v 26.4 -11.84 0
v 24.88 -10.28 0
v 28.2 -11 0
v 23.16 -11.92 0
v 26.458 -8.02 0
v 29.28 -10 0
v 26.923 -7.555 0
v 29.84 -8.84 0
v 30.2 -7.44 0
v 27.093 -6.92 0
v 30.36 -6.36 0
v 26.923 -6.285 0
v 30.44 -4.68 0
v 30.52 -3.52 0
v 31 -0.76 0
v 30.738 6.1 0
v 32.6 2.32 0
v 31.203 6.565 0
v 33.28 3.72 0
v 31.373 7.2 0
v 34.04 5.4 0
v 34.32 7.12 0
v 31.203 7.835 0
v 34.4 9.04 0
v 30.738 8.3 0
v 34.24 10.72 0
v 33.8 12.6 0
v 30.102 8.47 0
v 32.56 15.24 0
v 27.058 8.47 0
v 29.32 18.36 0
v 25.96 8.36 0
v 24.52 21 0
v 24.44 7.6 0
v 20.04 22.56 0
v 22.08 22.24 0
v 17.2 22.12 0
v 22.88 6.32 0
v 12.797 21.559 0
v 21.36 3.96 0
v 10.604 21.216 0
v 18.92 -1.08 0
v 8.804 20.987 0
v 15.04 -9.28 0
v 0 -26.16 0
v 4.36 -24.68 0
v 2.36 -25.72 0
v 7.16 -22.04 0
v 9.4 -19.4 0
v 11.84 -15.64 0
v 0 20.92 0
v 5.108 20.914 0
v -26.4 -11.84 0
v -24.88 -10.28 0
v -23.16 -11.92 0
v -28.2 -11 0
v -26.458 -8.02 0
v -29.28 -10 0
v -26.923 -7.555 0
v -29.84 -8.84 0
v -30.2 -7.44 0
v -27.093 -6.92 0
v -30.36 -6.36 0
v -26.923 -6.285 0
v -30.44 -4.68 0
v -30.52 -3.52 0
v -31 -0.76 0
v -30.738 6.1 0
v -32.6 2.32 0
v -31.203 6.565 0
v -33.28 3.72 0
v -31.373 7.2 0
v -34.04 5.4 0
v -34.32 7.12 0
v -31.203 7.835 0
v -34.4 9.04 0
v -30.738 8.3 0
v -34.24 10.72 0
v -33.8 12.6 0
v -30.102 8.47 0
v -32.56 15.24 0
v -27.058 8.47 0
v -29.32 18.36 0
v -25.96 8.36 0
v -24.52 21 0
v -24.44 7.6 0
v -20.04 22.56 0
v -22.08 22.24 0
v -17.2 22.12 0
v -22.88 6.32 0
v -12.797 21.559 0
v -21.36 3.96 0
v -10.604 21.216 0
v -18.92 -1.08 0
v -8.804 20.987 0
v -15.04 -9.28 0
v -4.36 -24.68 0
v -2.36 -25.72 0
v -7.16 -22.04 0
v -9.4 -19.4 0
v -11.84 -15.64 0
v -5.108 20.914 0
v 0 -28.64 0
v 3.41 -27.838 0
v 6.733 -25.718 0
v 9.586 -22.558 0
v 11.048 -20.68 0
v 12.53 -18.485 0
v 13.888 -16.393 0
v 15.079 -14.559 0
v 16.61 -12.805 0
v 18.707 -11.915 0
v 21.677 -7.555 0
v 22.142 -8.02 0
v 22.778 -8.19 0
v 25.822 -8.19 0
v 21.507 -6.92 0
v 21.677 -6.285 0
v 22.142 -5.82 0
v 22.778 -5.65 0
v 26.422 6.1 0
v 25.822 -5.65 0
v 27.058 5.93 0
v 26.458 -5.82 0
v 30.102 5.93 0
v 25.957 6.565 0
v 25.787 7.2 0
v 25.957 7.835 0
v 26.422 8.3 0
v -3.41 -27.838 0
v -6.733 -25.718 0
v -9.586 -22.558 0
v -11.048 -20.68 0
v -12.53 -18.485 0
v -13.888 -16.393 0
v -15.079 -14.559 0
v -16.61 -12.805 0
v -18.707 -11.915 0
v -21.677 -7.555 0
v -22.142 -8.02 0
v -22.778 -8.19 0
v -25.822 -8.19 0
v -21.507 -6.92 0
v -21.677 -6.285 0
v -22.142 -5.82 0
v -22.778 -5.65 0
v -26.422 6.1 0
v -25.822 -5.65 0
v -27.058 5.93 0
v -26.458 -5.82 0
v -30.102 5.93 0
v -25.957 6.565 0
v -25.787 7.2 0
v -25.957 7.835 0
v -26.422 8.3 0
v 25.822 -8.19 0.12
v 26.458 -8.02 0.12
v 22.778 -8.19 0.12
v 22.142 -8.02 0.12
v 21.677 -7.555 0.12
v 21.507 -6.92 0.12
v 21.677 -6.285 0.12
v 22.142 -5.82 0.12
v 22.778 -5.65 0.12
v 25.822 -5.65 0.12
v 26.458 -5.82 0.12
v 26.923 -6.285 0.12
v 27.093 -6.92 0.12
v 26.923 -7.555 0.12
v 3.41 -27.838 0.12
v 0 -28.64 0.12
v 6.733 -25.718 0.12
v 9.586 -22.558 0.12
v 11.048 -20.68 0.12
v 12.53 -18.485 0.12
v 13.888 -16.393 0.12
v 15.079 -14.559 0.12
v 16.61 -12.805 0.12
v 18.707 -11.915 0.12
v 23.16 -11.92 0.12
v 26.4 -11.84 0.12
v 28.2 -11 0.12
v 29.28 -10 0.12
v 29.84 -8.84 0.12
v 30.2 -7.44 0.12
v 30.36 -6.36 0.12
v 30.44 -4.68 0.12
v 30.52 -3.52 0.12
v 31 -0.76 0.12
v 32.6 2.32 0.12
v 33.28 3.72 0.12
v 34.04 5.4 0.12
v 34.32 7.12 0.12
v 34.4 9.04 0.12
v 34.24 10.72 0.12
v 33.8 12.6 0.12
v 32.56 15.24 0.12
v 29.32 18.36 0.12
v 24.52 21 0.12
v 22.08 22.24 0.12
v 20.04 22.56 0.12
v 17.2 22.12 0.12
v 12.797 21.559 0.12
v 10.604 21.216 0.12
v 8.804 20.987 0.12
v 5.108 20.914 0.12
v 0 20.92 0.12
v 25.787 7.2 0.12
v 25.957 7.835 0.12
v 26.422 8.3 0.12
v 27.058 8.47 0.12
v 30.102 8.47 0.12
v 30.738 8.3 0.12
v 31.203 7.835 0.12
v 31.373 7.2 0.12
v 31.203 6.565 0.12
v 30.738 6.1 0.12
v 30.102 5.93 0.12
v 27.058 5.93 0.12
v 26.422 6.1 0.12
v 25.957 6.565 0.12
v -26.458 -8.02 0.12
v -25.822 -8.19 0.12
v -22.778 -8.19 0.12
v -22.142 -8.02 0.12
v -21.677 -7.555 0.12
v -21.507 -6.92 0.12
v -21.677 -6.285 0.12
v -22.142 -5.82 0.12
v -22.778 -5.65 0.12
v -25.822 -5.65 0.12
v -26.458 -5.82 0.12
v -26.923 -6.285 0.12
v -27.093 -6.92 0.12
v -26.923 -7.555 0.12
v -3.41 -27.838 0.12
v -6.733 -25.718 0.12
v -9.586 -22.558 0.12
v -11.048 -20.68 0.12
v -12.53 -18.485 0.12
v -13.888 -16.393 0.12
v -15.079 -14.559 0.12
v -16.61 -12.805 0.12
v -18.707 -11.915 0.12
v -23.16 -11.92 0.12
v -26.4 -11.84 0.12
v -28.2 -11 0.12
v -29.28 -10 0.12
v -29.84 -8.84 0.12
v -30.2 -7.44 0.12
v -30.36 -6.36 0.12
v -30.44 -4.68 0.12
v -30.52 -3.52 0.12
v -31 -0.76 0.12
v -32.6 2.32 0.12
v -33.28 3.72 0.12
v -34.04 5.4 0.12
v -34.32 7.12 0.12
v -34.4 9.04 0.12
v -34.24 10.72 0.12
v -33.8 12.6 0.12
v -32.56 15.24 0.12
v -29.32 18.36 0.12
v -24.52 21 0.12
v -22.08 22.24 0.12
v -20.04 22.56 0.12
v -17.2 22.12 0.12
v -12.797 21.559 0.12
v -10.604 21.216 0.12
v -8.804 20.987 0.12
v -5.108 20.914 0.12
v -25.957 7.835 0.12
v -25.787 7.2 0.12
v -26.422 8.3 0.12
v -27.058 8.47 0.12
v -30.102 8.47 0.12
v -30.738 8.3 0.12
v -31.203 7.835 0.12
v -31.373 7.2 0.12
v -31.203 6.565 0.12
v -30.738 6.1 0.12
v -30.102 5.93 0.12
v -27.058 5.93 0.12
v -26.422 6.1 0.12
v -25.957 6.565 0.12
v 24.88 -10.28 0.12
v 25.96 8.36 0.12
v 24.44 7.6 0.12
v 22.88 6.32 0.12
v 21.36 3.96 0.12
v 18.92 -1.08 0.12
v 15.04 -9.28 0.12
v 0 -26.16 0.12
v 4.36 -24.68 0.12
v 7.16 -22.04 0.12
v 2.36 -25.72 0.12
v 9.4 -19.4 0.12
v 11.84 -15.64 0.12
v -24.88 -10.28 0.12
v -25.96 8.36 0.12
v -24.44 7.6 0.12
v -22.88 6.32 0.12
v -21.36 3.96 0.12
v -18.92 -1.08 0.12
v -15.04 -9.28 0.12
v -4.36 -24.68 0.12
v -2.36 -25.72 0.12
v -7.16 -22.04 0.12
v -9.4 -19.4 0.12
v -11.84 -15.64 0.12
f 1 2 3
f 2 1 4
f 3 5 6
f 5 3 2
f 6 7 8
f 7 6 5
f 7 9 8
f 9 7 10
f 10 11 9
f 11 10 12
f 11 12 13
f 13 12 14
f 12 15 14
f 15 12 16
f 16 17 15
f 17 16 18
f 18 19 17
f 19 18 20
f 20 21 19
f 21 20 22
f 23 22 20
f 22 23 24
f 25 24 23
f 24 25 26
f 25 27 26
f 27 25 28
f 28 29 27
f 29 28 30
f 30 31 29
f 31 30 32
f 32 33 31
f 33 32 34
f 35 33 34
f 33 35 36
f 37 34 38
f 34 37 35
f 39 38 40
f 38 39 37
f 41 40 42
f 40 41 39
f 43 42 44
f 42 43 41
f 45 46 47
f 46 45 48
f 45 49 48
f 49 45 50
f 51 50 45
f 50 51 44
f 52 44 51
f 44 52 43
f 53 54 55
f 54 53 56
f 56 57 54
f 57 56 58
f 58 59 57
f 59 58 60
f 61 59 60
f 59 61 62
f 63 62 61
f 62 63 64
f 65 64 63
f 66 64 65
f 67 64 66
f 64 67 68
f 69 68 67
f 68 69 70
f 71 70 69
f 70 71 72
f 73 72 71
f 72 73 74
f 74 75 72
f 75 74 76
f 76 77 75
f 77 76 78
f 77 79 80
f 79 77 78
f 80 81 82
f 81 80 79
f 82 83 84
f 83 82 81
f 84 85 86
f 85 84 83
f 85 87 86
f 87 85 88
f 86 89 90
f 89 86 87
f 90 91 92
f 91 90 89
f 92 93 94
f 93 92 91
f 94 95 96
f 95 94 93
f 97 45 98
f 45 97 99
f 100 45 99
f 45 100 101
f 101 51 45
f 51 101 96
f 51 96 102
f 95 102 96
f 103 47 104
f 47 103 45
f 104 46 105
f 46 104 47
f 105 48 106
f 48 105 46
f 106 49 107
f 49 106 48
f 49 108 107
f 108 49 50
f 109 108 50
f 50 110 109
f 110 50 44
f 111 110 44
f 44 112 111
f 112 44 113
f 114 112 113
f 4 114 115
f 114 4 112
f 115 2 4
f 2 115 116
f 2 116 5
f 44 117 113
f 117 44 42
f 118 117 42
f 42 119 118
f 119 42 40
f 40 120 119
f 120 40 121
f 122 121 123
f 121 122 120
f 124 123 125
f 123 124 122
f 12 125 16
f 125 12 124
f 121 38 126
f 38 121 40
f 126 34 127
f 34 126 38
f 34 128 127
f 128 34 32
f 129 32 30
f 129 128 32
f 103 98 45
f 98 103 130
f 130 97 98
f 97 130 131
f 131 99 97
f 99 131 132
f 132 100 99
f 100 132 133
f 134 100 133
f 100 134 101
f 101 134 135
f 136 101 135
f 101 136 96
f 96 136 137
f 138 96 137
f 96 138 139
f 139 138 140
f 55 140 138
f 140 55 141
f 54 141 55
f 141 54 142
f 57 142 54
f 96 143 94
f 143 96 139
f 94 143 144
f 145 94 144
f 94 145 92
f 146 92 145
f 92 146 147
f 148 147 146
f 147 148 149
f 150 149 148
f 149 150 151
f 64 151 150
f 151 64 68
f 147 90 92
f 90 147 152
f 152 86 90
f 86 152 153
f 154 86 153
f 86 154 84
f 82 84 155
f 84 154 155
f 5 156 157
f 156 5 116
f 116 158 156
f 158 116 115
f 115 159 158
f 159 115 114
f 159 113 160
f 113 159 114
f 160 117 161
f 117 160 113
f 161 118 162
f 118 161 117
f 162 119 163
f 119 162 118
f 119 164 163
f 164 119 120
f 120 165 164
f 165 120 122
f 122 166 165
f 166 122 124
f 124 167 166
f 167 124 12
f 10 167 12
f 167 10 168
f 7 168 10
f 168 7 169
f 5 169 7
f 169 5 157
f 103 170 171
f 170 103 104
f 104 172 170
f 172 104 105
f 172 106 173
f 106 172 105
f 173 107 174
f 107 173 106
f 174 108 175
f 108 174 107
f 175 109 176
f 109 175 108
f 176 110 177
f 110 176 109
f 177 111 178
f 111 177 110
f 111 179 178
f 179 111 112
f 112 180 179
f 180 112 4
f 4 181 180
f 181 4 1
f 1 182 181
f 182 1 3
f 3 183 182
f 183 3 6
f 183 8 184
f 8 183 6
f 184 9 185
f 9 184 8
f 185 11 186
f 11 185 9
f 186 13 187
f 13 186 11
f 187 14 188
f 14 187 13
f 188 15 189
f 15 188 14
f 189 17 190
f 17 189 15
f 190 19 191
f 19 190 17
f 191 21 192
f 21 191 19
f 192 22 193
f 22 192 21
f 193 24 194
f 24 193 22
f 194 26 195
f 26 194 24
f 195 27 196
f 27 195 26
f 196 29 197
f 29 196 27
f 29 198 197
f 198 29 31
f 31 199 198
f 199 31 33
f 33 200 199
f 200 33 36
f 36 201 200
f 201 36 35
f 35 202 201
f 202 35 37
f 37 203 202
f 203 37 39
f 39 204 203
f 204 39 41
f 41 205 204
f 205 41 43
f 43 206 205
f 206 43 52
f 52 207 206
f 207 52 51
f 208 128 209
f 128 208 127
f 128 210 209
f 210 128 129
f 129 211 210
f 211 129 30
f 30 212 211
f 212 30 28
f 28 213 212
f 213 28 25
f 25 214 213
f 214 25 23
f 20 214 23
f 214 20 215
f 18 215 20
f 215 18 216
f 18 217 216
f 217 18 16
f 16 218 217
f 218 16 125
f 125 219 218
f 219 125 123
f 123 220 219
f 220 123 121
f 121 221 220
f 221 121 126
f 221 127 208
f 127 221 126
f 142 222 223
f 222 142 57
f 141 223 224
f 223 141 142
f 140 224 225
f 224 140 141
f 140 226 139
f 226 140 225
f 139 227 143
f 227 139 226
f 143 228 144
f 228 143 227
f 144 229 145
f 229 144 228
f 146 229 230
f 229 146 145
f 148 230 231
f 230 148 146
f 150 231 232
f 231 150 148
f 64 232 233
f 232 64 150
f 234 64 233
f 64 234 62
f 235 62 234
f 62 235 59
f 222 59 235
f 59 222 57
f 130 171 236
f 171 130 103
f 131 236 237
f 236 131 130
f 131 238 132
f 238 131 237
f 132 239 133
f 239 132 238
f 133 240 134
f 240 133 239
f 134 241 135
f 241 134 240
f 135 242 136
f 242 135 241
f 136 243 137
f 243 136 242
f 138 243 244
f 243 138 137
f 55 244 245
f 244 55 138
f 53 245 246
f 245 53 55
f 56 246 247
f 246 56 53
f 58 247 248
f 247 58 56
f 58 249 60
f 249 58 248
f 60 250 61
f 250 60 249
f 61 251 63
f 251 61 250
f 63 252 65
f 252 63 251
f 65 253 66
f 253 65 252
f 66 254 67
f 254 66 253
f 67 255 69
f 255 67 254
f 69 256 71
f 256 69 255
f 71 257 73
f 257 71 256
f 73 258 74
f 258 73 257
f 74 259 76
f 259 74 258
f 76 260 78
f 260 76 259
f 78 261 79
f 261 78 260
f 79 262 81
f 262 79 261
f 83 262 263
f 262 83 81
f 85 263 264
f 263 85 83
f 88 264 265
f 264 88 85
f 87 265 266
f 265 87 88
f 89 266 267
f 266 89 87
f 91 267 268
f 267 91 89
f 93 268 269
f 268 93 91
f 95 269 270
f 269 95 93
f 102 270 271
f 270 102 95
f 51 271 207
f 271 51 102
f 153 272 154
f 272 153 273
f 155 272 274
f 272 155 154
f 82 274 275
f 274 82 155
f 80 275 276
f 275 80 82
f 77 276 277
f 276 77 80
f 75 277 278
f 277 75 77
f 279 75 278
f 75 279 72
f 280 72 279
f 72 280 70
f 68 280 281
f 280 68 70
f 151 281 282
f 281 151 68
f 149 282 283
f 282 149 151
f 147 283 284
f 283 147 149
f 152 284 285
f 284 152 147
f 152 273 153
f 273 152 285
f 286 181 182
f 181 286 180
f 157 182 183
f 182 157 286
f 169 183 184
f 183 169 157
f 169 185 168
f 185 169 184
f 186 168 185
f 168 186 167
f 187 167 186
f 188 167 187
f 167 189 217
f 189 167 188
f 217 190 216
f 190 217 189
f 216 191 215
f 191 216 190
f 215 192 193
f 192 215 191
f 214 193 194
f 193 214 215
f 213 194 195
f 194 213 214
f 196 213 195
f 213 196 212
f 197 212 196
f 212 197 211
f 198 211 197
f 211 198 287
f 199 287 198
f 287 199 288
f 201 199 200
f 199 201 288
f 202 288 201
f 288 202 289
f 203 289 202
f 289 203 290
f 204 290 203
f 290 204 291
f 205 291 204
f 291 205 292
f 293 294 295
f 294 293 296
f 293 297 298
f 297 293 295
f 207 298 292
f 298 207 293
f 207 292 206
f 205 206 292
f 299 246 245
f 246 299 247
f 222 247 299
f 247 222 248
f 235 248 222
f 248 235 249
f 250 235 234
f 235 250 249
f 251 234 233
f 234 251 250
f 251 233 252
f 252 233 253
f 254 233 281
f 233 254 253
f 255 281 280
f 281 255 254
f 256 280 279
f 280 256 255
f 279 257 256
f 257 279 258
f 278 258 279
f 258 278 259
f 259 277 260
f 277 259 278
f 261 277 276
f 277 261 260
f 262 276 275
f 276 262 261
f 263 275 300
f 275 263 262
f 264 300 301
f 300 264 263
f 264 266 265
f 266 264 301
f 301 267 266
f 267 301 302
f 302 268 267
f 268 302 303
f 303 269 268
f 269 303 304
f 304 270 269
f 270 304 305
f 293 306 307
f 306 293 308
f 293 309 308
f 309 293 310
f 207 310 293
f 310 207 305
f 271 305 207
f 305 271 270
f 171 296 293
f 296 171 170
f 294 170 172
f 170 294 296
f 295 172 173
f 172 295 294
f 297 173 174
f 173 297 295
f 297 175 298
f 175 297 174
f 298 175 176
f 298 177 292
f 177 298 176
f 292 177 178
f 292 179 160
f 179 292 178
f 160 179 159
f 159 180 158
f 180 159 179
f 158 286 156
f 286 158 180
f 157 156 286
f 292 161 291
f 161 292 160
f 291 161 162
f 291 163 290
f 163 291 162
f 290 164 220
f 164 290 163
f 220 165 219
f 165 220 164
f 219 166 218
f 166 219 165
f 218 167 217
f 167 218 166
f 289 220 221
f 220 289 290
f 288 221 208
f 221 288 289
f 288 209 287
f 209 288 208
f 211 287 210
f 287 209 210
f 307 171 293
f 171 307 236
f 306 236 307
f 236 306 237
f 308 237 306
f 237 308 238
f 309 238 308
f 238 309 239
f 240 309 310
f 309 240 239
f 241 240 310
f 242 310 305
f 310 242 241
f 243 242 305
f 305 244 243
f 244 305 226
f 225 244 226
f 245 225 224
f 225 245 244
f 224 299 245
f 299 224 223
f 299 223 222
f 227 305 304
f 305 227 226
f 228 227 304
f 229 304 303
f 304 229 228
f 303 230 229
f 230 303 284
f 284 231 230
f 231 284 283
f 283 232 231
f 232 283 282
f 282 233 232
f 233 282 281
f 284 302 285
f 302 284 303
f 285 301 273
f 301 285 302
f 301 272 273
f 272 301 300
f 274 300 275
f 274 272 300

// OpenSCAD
// file: s/67144s02.scad
use <../../lib.scad>
function ldraw_lib__s__67144s02() = [
// 0 ~Sheet Plastic  8.5 x  7 Motorcycle Windscreen Border
// 0 Name: s\67144s02.dat
// 0 Author: Philippe Hurbain [Philo]
// 0 !LDRAW_ORG Subpart UPDATE 2023-05
// 0 !LICENSE Licensed under CC BY 4.0 : see CAreadme.txt
// 
// 0 BFC CERTIFY CCW
  [0,"BFC","CERTIFY"],
  [0,"BFC","CCW"],
// 
// 0 !HISTORY 2023-10-31 [OrionP] Official Update 2023-05
// 
// 
// 4 16 0 0 -65.4 0 0 -71.6 8.52439 0 -69.59618 5.9 0 -64.3
  [4,16,0,0,-65.4,0,0,-71.6,8.52439,0,-69.59618,5.9,0,-64.3],
// 4 16 10.9 0 -61.7 5.9 0 -64.3 8.52439 0 -69.59618 16.83324 0 -64.29516
  [4,16,10.9,0,-61.7,5.9,0,-64.3,8.52439,0,-69.59618,16.83324,0,-64.29516],
// 4 16 17.9 0 -55.1 10.9 0 -61.7 16.83324 0 -64.29516 23.96543 0 -56.39425
  [4,16,17.9,0,-55.1,10.9,0,-61.7,16.83324,0,-64.29516,23.96543,0,-56.39425],
// 4 16 23.5 0 -48.5 17.9 0 -55.1 23.96543 0 -56.39425 27.62011 0 -51.6993
  [4,16,23.5,0,-48.5,17.9,0,-55.1,23.96543,0,-56.39425,27.62011,0,-51.6993],
// 4 16 23.5 0 -48.5 27.62011 0 -51.6993 31.32512 0 -46.21306 29.6 0 -39.1
  [4,16,23.5,0,-48.5,27.62011,0,-51.6993,31.32512,0,-46.21306,29.6,0,-39.1],
// 3 16 29.6 0 -39.1 31.32512 0 -46.21306 34.71881 0 -40.98355
  [3,16,29.6,0,-39.1,31.32512,0,-46.21306,34.71881,0,-40.98355],
// 4 16 29.6 0 -39.1 34.71881 0 -40.98355 37.698 0 -36.39858 37.6 0 -23.2
  [4,16,29.6,0,-39.1,34.71881,0,-40.98355,37.698,0,-36.39858,37.6,0,-23.2],
// 3 16 37.6 0 -23.2 37.698 0 -36.39858 41.52391 0 -32.01343
  [3,16,37.6,0,-23.2,37.698,0,-36.39858,41.52391,0,-32.01343],
// 4 16 37.6 0 -23.2 41.52391 0 -32.01343 46.76639 0 -29.78813 54.19371 0 -18.88783
  [4,16,37.6,0,-23.2,41.52391,0,-32.01343,46.76639,0,-29.78813,54.19371,0,-18.88783],
// 3 16 54.19371 0 -18.88783 46.76639 0 -29.78813 55.35609 0 -20.05021
  [3,16,54.19371,0,-18.88783,46.76639,0,-29.78813,55.35609,0,-20.05021],
// 4 16 56.94392 0 -20.47566 55.35609 0 -20.05021 46.76639 0 -29.78813 57.9 0 -29.8
  [4,16,56.94392,0,-20.47566,55.35609,0,-20.05021,46.76639,0,-29.78813,57.9,0,-29.8],
// 4 16 56.94392 0 -20.47566 57.9 0 -29.8 62.2 0 -25.7 64.55608 0 -20.47566
  [4,16,56.94392,0,-20.47566,57.9,0,-29.8,62.2,0,-25.7,64.55608,0,-20.47566],
// 3 16 66.14391 0 -20.05021 64.55608 0 -20.47566 62.2 0 -25.7
  [3,16,66.14391,0,-20.05021,64.55608,0,-20.47566,62.2,0,-25.7],
// 4 16 37.6 0 -23.2 54.19371 0 -18.88783 53.76825 0 -17.3 47.3 0 -2.7
  [4,16,37.6,0,-23.2,54.19371,0,-18.88783,53.76825,0,-17.3,47.3,0,-2.7],
// 3 16 47.3 0 -2.7 53.76825 0 -17.3 54.19371 0 -15.71217
  [3,16,47.3,0,-2.7,53.76825,0,-17.3,54.19371,0,-15.71217],
// 4 16 47.3 0 -2.7 54.19371 0 -15.71217 55.35609 0 -14.54979 53.4 0 9.9
  [4,16,47.3,0,-2.7,54.19371,0,-15.71217,55.35609,0,-14.54979,53.4,0,9.9],
// 4 16 53.4 0 9.9 55.35609 0 -14.54979 56.94392 0 -14.12434 66.05609 0 15.24979
  [4,16,53.4,0,9.9,55.35609,0,-14.54979,56.94392,0,-14.12434,66.05609,0,15.24979],
// 4 16 67.64392 0 14.82434 66.05609 0 15.24979 56.94392 0 -14.12434 64.55608 0 -14.12434
  [4,16,67.64392,0,14.82434,66.05609,0,15.24979,56.94392,0,-14.12434,64.55608,0,-14.12434],
// 4 16 75.25608 0 14.82434 67.64392 0 14.82434 64.55608 0 -14.12434 66.144 0 -14.55
  [4,16,75.25608,0,14.82434,67.64392,0,14.82434,64.55608,0,-14.12434,66.144,0,-14.55],
// 4 16 75.25608 0 14.82434 66.144 0 -14.55 67.30629 0 -15.71217 76.84391 0 15.24979
  [4,16,75.25608,0,14.82434,66.144,0,-14.55,67.30629,0,-15.71217,76.84391,0,15.24979],
// 4 16 53.4 0 9.9 66.05609 0 15.24979 64.89371 0 16.41217 57.2 0 15.8
  [4,16,53.4,0,9.9,66.05609,0,15.24979,64.89371,0,16.41217,57.2,0,15.8],
// 4 16 57.2 0 15.8 64.89371 0 16.41217 64.46825 0 18 61.1 0 19
  [4,16,57.2,0,15.8,64.89371,0,16.41217,64.46825,0,18,61.1,0,19],
// 4 16 61.1 0 19 64.46825 0 18 64.89371 0 19.58783 64.9 0 20.9
  [4,16,61.1,0,19,64.46825,0,18,64.89371,0,19.58783,64.9,0,20.9],
// 3 16 67.64392 0 21.17566 64.9 0 20.9 66.05609 0 20.75021
  [3,16,67.64392,0,21.17566,64.9,0,20.9,66.05609,0,20.75021],
// 3 16 64.9 0 20.9 64.89371 0 19.58783 66.05609 0 20.75021
  [3,16,64.9,0,20.9,64.89371,0,19.58783,66.05609,0,20.75021],
];
module ldraw_lib__s__67144s02(step=0, col=false, unit=2/5, alt=false, line=0.2, solid=!$preview)
    makepoly(ldraw_lib__s__67144s02(), step=step, col=col, unit=unit, alt=alt, line=line, solid=solid);
ldraw_lib__s__67144s02(line=0.2);
// file: s/67144s01.scad
use <../../lib.scad>
function ldraw_lib__s__67144s01() = [
// 0 ~Sheet Plastic  8.5 x  7 Motorcycle Windscreen Surface
// 0 Name: s\67144s01.dat
// 0 Author: Philippe Hurbain [Philo]
// 0 !LDRAW_ORG Subpart UPDATE 2023-05
// 0 !LICENSE Licensed under CC BY 4.0 : see CAreadme.txt
// 
// 0 BFC CERTIFY CCW
  [0,"BFC","CERTIFY"],
  [0,"BFC","CCW"],
// 
// 0 !HISTORY 2023-10-31 [OrionP] Official Update 2023-05
// 
// 
// 4 16 62.2 0 -25.7 57.9 0 -29.8 66 0 -29.6 70.5 0 -27.5
  [4,16,62.2,0,-25.7,57.9,0,-29.8,66,0,-29.6,70.5,0,-27.5],
// 4 16 66.14391 0 -20.05021 62.2 0 -25.7 70.5 0 -27.5 73.2 0 -25
  [4,16,66.14391,0,-20.05021,62.2,0,-25.7,70.5,0,-27.5,73.2,0,-25],
// 4 16 67.30629 0 -18.88783 66.14391 0 -20.05021 73.2 0 -25 74.6 0 -22.1
  [4,16,67.30629,0,-18.88783,66.14391,0,-20.05021,73.2,0,-25,74.6,0,-22.1],
// 4 16 67.30629 0 -18.88783 74.6 0 -22.1 75.5 0 -18.6 67.73175 0 -17.3
  [4,16,67.30629,0,-18.88783,74.6,0,-22.1,75.5,0,-18.6,67.73175,0,-17.3],
// 4 16 67.73175 0 -17.3 75.5 0 -18.6 75.9 0 -15.9 67.30629 0 -15.71217
  [4,16,67.73175,0,-17.3,75.5,0,-18.6,75.9,0,-15.9,67.30629,0,-15.71217],
// 3 16 76.1 0 -11.7 67.30629 0 -15.71217 75.9 0 -15.9
  [3,16,76.1,0,-11.7,67.30629,0,-15.71217,75.9,0,-15.9],
// 3 16 76.3 0 -8.8 67.30629 0 -15.71217 76.1 0 -11.7
  [3,16,76.3,0,-8.8,67.30629,0,-15.71217,76.1,0,-11.7],
// 4 16 67.30629 0 -15.71217 76.3 0 -8.8 77.5 0 -1.9 76.84391 0 15.24979
  [4,16,67.30629,0,-15.71217,76.3,0,-8.8,77.5,0,-1.9,76.84391,0,15.24979],
// 4 16 76.84391 0 15.24979 77.5 0 -1.9 81.5 0 5.8 78.00629 0 16.41217
  [4,16,76.84391,0,15.24979,77.5,0,-1.9,81.5,0,5.8,78.00629,0,16.41217],
// 4 16 78.00629 0 16.41217 81.5 0 5.8 83.2 0 9.3 78.43175 0 18
  [4,16,78.00629,0,16.41217,81.5,0,5.8,83.2,0,9.3,78.43175,0,18],
// 4 16 78.43175 0 18 83.2 0 9.3 85.1 0 13.5 85.8 0 17.8
  [4,16,78.43175,0,18,83.2,0,9.3,85.1,0,13.5,85.8,0,17.8],
// 4 16 78.43175 0 18 85.8 0 17.8 86 0 22.6 78.00629 0 19.58783
  [4,16,78.43175,0,18,85.8,0,17.8,86,0,22.6,78.00629,0,19.58783],
// 4 16 78.00629 0 19.58783 86 0 22.6 85.6 0 26.8 76.844 0 20.75
  [4,16,78.00629,0,19.58783,86,0,22.6,85.6,0,26.8,76.844,0,20.75],
// 4 16 76.844 0 20.75 85.6 0 26.8 84.5 0 31.5 75.25608 0 21.17566
  [4,16,76.844,0,20.75,85.6,0,26.8,84.5,0,31.5,75.25608,0,21.17566],
// 4 16 75.25608 0 21.17566 84.5 0 31.5 81.4 0 38.1 67.64392 0 21.17566
  [4,16,75.25608,0,21.17566,84.5,0,31.5,81.4,0,38.1,67.64392,0,21.17566],
// 4 16 67.64392 0 21.17566 81.4 0 38.1 73.3 0 45.9 64.9 0 20.9
  [4,16,67.64392,0,21.17566,81.4,0,38.1,73.3,0,45.9,64.9,0,20.9],
// 4 16 64.9 0 20.9 73.3 0 45.9 61.3 0 52.5 61.1 0 19
  [4,16,64.9,0,20.9,73.3,0,45.9,61.3,0,52.5,61.1,0,19],
// 4 16 61.1 0 19 61.3 0 52.5 55.2 0 55.6 50.1 0 56.4
  [4,16,61.1,0,19,61.3,0,52.5,55.2,0,55.6,50.1,0,56.4],
// 4 16 57.2 0 15.8 61.1 0 19 50.1 0 56.4 43 0 55.3
  [4,16,57.2,0,15.8,61.1,0,19,50.1,0,56.4,43,0,55.3],
// 4 16 53.4 0 9.9 57.2 0 15.8 43 0 55.3 31.99348 0 53.89863
  [4,16,53.4,0,9.9,57.2,0,15.8,43,0,55.3,31.99348,0,53.89863],
// 4 16 47.3 0 -2.7 53.4 0 9.9 31.99348 0 53.89863 26.50984 0 53.03947
  [4,16,47.3,0,-2.7,53.4,0,9.9,31.99348,0,53.89863,26.50984,0,53.03947],
// 4 16 37.6 0 -23.2 47.3 0 -2.7 26.50984 0 53.03947 22.01075 0 52.46784
  [4,16,37.6,0,-23.2,47.3,0,-2.7,26.50984,0,53.03947,22.01075,0,52.46784],
// 4 16 0 0 -65.4 5.9 0 -64.3 10.9 0 -61.7 17.9 0 -55.1
  [4,16,0,0,-65.4,5.9,0,-64.3,10.9,0,-61.7,17.9,0,-55.1],
// 4 16 0 0 -65.4 17.9 0 -55.1 23.5 0 -48.5 29.6 0 -39.1
  [4,16,0,0,-65.4,17.9,0,-55.1,23.5,0,-48.5,29.6,0,-39.1],
// 4 16 0 0 -65.4 29.6 0 -39.1 37.6 0 -23.2 0 0 52.3
  [4,16,0,0,-65.4,29.6,0,-39.1,37.6,0,-23.2,0,0,52.3],
// 3 16 0 0 52.3 37.6 0 -23.2 12.77089 0 52.2856
  [3,16,0,0,52.3,37.6,0,-23.2,12.77089,0,52.2856],
// 3 16 22.01075 0 52.46784 12.77089 0 52.2856 37.6 0 -23.2
  [3,16,22.01075,0,52.46784,12.77089,0,52.2856,37.6,0,-23.2],
];
module ldraw_lib__s__67144s01(step=0, col=false, unit=2/5, alt=false, line=0.2, solid=!$preview)
    makepoly(ldraw_lib__s__67144s01(), step=step, col=col, unit=unit, alt=alt, line=line, solid=solid);
ldraw_lib__s__67144s01(line=0.2);
// main file
use <../lib.scad>
use <s/67144s01.scad>
use <s/67144s02.scad>
use <s/67144s03.scad>
function ldraw_lib__67144() = [
// 0 Sheet Plastic  8.5 x  7 Motorcycle Windscreen
// 0 Name: 67144.dat
// 0 Author: Philippe Hurbain [Philo]
// 0 !LDRAW_ORG Part UPDATE 2023-05
// 0 !LICENSE Licensed under CC BY 4.0 : see CAreadme.txt
// 
// 0 BFC CERTIFY CCW
  [0,"BFC","CERTIFY"],
  [0,"BFC","CCW"],
// 
// 0 !CATEGORY Sheet Plastic
// 0 !KEYWORDS bike, Ducati Panigale, Set 42107
// 
// 0 !HISTORY 2023-10-31 [OrionP] Official Update 2023-05
// 
// 
// 1 16 0 0 0 1 0 0 0 -1 0 0 0 1 s\67144s01.dat
  [1,16,0,0,0,1,0,0,0,-1,0,0,0,1, ldraw_lib__s__67144s01()],
// 1 16 0 0 0 -1 0 0 0 -1 0 0 0 1 s\67144s01.dat
  [1,16,0,0,0,-1,0,0,0,-1,0,0,0,1, ldraw_lib__s__67144s01()],
// 1 16 0 0 0 1 0 0 0 -1 0 0 0 1 s\67144s02.dat
  [1,16,0,0,0,1,0,0,0,-1,0,0,0,1, ldraw_lib__s__67144s02()],
// 1 16 0 0 0 -1 0 0 0 -1 0 0 0 1 s\67144s02.dat
  [1,16,0,0,0,-1,0,0,0,-1,0,0,0,1, ldraw_lib__s__67144s02()],
// 1 16 0 0 0 1 0 0 0 1 0 0 0 1 s\67144s03.dat
  [1,16,0,0,0,1,0,0,0,1,0,0,0,1, ldraw_lib__s__67144s03()],
// 1 16 0 0 0 -1 0 0 0 1 0 0 0 1 s\67144s03.dat
  [1,16,0,0,0,-1,0,0,0,1,0,0,0,1, ldraw_lib__s__67144s03()],
// 1 16 0 -.3 0 1 0 0 0 1 0 0 0 1 s\67144s01.dat
  [1,16,0,-.3,0,1,0,0,0,1,0,0,0,1, ldraw_lib__s__67144s01()],
// 1 16 0 -.3 0 -1 0 0 0 1 0 0 0 1 s\67144s01.dat
  [1,16,0,-.3,0,-1,0,0,0,1,0,0,0,1, ldraw_lib__s__67144s01()],
// 1 16 0 -.3 0 1 0 0 0 1 0 0 0 1 s\67144s02.dat
  [1,16,0,-.3,0,1,0,0,0,1,0,0,0,1, ldraw_lib__s__67144s02()],
// 1 16 0 -.3 0 -1 0 0 0 1 0 0 0 1 s\67144s02.dat
  [1,16,0,-.3,0,-1,0,0,0,1,0,0,0,1, ldraw_lib__s__67144s02()],
];
module ldraw_lib__67144(step=0, col=false, unit=2/5, alt=false, line=0.2, solid=!$preview)
    makepoly(ldraw_lib__67144(), step=step, col=col, unit=unit, alt=alt, line=line, solid=solid);
ldraw_lib__67144(line=0.2);
